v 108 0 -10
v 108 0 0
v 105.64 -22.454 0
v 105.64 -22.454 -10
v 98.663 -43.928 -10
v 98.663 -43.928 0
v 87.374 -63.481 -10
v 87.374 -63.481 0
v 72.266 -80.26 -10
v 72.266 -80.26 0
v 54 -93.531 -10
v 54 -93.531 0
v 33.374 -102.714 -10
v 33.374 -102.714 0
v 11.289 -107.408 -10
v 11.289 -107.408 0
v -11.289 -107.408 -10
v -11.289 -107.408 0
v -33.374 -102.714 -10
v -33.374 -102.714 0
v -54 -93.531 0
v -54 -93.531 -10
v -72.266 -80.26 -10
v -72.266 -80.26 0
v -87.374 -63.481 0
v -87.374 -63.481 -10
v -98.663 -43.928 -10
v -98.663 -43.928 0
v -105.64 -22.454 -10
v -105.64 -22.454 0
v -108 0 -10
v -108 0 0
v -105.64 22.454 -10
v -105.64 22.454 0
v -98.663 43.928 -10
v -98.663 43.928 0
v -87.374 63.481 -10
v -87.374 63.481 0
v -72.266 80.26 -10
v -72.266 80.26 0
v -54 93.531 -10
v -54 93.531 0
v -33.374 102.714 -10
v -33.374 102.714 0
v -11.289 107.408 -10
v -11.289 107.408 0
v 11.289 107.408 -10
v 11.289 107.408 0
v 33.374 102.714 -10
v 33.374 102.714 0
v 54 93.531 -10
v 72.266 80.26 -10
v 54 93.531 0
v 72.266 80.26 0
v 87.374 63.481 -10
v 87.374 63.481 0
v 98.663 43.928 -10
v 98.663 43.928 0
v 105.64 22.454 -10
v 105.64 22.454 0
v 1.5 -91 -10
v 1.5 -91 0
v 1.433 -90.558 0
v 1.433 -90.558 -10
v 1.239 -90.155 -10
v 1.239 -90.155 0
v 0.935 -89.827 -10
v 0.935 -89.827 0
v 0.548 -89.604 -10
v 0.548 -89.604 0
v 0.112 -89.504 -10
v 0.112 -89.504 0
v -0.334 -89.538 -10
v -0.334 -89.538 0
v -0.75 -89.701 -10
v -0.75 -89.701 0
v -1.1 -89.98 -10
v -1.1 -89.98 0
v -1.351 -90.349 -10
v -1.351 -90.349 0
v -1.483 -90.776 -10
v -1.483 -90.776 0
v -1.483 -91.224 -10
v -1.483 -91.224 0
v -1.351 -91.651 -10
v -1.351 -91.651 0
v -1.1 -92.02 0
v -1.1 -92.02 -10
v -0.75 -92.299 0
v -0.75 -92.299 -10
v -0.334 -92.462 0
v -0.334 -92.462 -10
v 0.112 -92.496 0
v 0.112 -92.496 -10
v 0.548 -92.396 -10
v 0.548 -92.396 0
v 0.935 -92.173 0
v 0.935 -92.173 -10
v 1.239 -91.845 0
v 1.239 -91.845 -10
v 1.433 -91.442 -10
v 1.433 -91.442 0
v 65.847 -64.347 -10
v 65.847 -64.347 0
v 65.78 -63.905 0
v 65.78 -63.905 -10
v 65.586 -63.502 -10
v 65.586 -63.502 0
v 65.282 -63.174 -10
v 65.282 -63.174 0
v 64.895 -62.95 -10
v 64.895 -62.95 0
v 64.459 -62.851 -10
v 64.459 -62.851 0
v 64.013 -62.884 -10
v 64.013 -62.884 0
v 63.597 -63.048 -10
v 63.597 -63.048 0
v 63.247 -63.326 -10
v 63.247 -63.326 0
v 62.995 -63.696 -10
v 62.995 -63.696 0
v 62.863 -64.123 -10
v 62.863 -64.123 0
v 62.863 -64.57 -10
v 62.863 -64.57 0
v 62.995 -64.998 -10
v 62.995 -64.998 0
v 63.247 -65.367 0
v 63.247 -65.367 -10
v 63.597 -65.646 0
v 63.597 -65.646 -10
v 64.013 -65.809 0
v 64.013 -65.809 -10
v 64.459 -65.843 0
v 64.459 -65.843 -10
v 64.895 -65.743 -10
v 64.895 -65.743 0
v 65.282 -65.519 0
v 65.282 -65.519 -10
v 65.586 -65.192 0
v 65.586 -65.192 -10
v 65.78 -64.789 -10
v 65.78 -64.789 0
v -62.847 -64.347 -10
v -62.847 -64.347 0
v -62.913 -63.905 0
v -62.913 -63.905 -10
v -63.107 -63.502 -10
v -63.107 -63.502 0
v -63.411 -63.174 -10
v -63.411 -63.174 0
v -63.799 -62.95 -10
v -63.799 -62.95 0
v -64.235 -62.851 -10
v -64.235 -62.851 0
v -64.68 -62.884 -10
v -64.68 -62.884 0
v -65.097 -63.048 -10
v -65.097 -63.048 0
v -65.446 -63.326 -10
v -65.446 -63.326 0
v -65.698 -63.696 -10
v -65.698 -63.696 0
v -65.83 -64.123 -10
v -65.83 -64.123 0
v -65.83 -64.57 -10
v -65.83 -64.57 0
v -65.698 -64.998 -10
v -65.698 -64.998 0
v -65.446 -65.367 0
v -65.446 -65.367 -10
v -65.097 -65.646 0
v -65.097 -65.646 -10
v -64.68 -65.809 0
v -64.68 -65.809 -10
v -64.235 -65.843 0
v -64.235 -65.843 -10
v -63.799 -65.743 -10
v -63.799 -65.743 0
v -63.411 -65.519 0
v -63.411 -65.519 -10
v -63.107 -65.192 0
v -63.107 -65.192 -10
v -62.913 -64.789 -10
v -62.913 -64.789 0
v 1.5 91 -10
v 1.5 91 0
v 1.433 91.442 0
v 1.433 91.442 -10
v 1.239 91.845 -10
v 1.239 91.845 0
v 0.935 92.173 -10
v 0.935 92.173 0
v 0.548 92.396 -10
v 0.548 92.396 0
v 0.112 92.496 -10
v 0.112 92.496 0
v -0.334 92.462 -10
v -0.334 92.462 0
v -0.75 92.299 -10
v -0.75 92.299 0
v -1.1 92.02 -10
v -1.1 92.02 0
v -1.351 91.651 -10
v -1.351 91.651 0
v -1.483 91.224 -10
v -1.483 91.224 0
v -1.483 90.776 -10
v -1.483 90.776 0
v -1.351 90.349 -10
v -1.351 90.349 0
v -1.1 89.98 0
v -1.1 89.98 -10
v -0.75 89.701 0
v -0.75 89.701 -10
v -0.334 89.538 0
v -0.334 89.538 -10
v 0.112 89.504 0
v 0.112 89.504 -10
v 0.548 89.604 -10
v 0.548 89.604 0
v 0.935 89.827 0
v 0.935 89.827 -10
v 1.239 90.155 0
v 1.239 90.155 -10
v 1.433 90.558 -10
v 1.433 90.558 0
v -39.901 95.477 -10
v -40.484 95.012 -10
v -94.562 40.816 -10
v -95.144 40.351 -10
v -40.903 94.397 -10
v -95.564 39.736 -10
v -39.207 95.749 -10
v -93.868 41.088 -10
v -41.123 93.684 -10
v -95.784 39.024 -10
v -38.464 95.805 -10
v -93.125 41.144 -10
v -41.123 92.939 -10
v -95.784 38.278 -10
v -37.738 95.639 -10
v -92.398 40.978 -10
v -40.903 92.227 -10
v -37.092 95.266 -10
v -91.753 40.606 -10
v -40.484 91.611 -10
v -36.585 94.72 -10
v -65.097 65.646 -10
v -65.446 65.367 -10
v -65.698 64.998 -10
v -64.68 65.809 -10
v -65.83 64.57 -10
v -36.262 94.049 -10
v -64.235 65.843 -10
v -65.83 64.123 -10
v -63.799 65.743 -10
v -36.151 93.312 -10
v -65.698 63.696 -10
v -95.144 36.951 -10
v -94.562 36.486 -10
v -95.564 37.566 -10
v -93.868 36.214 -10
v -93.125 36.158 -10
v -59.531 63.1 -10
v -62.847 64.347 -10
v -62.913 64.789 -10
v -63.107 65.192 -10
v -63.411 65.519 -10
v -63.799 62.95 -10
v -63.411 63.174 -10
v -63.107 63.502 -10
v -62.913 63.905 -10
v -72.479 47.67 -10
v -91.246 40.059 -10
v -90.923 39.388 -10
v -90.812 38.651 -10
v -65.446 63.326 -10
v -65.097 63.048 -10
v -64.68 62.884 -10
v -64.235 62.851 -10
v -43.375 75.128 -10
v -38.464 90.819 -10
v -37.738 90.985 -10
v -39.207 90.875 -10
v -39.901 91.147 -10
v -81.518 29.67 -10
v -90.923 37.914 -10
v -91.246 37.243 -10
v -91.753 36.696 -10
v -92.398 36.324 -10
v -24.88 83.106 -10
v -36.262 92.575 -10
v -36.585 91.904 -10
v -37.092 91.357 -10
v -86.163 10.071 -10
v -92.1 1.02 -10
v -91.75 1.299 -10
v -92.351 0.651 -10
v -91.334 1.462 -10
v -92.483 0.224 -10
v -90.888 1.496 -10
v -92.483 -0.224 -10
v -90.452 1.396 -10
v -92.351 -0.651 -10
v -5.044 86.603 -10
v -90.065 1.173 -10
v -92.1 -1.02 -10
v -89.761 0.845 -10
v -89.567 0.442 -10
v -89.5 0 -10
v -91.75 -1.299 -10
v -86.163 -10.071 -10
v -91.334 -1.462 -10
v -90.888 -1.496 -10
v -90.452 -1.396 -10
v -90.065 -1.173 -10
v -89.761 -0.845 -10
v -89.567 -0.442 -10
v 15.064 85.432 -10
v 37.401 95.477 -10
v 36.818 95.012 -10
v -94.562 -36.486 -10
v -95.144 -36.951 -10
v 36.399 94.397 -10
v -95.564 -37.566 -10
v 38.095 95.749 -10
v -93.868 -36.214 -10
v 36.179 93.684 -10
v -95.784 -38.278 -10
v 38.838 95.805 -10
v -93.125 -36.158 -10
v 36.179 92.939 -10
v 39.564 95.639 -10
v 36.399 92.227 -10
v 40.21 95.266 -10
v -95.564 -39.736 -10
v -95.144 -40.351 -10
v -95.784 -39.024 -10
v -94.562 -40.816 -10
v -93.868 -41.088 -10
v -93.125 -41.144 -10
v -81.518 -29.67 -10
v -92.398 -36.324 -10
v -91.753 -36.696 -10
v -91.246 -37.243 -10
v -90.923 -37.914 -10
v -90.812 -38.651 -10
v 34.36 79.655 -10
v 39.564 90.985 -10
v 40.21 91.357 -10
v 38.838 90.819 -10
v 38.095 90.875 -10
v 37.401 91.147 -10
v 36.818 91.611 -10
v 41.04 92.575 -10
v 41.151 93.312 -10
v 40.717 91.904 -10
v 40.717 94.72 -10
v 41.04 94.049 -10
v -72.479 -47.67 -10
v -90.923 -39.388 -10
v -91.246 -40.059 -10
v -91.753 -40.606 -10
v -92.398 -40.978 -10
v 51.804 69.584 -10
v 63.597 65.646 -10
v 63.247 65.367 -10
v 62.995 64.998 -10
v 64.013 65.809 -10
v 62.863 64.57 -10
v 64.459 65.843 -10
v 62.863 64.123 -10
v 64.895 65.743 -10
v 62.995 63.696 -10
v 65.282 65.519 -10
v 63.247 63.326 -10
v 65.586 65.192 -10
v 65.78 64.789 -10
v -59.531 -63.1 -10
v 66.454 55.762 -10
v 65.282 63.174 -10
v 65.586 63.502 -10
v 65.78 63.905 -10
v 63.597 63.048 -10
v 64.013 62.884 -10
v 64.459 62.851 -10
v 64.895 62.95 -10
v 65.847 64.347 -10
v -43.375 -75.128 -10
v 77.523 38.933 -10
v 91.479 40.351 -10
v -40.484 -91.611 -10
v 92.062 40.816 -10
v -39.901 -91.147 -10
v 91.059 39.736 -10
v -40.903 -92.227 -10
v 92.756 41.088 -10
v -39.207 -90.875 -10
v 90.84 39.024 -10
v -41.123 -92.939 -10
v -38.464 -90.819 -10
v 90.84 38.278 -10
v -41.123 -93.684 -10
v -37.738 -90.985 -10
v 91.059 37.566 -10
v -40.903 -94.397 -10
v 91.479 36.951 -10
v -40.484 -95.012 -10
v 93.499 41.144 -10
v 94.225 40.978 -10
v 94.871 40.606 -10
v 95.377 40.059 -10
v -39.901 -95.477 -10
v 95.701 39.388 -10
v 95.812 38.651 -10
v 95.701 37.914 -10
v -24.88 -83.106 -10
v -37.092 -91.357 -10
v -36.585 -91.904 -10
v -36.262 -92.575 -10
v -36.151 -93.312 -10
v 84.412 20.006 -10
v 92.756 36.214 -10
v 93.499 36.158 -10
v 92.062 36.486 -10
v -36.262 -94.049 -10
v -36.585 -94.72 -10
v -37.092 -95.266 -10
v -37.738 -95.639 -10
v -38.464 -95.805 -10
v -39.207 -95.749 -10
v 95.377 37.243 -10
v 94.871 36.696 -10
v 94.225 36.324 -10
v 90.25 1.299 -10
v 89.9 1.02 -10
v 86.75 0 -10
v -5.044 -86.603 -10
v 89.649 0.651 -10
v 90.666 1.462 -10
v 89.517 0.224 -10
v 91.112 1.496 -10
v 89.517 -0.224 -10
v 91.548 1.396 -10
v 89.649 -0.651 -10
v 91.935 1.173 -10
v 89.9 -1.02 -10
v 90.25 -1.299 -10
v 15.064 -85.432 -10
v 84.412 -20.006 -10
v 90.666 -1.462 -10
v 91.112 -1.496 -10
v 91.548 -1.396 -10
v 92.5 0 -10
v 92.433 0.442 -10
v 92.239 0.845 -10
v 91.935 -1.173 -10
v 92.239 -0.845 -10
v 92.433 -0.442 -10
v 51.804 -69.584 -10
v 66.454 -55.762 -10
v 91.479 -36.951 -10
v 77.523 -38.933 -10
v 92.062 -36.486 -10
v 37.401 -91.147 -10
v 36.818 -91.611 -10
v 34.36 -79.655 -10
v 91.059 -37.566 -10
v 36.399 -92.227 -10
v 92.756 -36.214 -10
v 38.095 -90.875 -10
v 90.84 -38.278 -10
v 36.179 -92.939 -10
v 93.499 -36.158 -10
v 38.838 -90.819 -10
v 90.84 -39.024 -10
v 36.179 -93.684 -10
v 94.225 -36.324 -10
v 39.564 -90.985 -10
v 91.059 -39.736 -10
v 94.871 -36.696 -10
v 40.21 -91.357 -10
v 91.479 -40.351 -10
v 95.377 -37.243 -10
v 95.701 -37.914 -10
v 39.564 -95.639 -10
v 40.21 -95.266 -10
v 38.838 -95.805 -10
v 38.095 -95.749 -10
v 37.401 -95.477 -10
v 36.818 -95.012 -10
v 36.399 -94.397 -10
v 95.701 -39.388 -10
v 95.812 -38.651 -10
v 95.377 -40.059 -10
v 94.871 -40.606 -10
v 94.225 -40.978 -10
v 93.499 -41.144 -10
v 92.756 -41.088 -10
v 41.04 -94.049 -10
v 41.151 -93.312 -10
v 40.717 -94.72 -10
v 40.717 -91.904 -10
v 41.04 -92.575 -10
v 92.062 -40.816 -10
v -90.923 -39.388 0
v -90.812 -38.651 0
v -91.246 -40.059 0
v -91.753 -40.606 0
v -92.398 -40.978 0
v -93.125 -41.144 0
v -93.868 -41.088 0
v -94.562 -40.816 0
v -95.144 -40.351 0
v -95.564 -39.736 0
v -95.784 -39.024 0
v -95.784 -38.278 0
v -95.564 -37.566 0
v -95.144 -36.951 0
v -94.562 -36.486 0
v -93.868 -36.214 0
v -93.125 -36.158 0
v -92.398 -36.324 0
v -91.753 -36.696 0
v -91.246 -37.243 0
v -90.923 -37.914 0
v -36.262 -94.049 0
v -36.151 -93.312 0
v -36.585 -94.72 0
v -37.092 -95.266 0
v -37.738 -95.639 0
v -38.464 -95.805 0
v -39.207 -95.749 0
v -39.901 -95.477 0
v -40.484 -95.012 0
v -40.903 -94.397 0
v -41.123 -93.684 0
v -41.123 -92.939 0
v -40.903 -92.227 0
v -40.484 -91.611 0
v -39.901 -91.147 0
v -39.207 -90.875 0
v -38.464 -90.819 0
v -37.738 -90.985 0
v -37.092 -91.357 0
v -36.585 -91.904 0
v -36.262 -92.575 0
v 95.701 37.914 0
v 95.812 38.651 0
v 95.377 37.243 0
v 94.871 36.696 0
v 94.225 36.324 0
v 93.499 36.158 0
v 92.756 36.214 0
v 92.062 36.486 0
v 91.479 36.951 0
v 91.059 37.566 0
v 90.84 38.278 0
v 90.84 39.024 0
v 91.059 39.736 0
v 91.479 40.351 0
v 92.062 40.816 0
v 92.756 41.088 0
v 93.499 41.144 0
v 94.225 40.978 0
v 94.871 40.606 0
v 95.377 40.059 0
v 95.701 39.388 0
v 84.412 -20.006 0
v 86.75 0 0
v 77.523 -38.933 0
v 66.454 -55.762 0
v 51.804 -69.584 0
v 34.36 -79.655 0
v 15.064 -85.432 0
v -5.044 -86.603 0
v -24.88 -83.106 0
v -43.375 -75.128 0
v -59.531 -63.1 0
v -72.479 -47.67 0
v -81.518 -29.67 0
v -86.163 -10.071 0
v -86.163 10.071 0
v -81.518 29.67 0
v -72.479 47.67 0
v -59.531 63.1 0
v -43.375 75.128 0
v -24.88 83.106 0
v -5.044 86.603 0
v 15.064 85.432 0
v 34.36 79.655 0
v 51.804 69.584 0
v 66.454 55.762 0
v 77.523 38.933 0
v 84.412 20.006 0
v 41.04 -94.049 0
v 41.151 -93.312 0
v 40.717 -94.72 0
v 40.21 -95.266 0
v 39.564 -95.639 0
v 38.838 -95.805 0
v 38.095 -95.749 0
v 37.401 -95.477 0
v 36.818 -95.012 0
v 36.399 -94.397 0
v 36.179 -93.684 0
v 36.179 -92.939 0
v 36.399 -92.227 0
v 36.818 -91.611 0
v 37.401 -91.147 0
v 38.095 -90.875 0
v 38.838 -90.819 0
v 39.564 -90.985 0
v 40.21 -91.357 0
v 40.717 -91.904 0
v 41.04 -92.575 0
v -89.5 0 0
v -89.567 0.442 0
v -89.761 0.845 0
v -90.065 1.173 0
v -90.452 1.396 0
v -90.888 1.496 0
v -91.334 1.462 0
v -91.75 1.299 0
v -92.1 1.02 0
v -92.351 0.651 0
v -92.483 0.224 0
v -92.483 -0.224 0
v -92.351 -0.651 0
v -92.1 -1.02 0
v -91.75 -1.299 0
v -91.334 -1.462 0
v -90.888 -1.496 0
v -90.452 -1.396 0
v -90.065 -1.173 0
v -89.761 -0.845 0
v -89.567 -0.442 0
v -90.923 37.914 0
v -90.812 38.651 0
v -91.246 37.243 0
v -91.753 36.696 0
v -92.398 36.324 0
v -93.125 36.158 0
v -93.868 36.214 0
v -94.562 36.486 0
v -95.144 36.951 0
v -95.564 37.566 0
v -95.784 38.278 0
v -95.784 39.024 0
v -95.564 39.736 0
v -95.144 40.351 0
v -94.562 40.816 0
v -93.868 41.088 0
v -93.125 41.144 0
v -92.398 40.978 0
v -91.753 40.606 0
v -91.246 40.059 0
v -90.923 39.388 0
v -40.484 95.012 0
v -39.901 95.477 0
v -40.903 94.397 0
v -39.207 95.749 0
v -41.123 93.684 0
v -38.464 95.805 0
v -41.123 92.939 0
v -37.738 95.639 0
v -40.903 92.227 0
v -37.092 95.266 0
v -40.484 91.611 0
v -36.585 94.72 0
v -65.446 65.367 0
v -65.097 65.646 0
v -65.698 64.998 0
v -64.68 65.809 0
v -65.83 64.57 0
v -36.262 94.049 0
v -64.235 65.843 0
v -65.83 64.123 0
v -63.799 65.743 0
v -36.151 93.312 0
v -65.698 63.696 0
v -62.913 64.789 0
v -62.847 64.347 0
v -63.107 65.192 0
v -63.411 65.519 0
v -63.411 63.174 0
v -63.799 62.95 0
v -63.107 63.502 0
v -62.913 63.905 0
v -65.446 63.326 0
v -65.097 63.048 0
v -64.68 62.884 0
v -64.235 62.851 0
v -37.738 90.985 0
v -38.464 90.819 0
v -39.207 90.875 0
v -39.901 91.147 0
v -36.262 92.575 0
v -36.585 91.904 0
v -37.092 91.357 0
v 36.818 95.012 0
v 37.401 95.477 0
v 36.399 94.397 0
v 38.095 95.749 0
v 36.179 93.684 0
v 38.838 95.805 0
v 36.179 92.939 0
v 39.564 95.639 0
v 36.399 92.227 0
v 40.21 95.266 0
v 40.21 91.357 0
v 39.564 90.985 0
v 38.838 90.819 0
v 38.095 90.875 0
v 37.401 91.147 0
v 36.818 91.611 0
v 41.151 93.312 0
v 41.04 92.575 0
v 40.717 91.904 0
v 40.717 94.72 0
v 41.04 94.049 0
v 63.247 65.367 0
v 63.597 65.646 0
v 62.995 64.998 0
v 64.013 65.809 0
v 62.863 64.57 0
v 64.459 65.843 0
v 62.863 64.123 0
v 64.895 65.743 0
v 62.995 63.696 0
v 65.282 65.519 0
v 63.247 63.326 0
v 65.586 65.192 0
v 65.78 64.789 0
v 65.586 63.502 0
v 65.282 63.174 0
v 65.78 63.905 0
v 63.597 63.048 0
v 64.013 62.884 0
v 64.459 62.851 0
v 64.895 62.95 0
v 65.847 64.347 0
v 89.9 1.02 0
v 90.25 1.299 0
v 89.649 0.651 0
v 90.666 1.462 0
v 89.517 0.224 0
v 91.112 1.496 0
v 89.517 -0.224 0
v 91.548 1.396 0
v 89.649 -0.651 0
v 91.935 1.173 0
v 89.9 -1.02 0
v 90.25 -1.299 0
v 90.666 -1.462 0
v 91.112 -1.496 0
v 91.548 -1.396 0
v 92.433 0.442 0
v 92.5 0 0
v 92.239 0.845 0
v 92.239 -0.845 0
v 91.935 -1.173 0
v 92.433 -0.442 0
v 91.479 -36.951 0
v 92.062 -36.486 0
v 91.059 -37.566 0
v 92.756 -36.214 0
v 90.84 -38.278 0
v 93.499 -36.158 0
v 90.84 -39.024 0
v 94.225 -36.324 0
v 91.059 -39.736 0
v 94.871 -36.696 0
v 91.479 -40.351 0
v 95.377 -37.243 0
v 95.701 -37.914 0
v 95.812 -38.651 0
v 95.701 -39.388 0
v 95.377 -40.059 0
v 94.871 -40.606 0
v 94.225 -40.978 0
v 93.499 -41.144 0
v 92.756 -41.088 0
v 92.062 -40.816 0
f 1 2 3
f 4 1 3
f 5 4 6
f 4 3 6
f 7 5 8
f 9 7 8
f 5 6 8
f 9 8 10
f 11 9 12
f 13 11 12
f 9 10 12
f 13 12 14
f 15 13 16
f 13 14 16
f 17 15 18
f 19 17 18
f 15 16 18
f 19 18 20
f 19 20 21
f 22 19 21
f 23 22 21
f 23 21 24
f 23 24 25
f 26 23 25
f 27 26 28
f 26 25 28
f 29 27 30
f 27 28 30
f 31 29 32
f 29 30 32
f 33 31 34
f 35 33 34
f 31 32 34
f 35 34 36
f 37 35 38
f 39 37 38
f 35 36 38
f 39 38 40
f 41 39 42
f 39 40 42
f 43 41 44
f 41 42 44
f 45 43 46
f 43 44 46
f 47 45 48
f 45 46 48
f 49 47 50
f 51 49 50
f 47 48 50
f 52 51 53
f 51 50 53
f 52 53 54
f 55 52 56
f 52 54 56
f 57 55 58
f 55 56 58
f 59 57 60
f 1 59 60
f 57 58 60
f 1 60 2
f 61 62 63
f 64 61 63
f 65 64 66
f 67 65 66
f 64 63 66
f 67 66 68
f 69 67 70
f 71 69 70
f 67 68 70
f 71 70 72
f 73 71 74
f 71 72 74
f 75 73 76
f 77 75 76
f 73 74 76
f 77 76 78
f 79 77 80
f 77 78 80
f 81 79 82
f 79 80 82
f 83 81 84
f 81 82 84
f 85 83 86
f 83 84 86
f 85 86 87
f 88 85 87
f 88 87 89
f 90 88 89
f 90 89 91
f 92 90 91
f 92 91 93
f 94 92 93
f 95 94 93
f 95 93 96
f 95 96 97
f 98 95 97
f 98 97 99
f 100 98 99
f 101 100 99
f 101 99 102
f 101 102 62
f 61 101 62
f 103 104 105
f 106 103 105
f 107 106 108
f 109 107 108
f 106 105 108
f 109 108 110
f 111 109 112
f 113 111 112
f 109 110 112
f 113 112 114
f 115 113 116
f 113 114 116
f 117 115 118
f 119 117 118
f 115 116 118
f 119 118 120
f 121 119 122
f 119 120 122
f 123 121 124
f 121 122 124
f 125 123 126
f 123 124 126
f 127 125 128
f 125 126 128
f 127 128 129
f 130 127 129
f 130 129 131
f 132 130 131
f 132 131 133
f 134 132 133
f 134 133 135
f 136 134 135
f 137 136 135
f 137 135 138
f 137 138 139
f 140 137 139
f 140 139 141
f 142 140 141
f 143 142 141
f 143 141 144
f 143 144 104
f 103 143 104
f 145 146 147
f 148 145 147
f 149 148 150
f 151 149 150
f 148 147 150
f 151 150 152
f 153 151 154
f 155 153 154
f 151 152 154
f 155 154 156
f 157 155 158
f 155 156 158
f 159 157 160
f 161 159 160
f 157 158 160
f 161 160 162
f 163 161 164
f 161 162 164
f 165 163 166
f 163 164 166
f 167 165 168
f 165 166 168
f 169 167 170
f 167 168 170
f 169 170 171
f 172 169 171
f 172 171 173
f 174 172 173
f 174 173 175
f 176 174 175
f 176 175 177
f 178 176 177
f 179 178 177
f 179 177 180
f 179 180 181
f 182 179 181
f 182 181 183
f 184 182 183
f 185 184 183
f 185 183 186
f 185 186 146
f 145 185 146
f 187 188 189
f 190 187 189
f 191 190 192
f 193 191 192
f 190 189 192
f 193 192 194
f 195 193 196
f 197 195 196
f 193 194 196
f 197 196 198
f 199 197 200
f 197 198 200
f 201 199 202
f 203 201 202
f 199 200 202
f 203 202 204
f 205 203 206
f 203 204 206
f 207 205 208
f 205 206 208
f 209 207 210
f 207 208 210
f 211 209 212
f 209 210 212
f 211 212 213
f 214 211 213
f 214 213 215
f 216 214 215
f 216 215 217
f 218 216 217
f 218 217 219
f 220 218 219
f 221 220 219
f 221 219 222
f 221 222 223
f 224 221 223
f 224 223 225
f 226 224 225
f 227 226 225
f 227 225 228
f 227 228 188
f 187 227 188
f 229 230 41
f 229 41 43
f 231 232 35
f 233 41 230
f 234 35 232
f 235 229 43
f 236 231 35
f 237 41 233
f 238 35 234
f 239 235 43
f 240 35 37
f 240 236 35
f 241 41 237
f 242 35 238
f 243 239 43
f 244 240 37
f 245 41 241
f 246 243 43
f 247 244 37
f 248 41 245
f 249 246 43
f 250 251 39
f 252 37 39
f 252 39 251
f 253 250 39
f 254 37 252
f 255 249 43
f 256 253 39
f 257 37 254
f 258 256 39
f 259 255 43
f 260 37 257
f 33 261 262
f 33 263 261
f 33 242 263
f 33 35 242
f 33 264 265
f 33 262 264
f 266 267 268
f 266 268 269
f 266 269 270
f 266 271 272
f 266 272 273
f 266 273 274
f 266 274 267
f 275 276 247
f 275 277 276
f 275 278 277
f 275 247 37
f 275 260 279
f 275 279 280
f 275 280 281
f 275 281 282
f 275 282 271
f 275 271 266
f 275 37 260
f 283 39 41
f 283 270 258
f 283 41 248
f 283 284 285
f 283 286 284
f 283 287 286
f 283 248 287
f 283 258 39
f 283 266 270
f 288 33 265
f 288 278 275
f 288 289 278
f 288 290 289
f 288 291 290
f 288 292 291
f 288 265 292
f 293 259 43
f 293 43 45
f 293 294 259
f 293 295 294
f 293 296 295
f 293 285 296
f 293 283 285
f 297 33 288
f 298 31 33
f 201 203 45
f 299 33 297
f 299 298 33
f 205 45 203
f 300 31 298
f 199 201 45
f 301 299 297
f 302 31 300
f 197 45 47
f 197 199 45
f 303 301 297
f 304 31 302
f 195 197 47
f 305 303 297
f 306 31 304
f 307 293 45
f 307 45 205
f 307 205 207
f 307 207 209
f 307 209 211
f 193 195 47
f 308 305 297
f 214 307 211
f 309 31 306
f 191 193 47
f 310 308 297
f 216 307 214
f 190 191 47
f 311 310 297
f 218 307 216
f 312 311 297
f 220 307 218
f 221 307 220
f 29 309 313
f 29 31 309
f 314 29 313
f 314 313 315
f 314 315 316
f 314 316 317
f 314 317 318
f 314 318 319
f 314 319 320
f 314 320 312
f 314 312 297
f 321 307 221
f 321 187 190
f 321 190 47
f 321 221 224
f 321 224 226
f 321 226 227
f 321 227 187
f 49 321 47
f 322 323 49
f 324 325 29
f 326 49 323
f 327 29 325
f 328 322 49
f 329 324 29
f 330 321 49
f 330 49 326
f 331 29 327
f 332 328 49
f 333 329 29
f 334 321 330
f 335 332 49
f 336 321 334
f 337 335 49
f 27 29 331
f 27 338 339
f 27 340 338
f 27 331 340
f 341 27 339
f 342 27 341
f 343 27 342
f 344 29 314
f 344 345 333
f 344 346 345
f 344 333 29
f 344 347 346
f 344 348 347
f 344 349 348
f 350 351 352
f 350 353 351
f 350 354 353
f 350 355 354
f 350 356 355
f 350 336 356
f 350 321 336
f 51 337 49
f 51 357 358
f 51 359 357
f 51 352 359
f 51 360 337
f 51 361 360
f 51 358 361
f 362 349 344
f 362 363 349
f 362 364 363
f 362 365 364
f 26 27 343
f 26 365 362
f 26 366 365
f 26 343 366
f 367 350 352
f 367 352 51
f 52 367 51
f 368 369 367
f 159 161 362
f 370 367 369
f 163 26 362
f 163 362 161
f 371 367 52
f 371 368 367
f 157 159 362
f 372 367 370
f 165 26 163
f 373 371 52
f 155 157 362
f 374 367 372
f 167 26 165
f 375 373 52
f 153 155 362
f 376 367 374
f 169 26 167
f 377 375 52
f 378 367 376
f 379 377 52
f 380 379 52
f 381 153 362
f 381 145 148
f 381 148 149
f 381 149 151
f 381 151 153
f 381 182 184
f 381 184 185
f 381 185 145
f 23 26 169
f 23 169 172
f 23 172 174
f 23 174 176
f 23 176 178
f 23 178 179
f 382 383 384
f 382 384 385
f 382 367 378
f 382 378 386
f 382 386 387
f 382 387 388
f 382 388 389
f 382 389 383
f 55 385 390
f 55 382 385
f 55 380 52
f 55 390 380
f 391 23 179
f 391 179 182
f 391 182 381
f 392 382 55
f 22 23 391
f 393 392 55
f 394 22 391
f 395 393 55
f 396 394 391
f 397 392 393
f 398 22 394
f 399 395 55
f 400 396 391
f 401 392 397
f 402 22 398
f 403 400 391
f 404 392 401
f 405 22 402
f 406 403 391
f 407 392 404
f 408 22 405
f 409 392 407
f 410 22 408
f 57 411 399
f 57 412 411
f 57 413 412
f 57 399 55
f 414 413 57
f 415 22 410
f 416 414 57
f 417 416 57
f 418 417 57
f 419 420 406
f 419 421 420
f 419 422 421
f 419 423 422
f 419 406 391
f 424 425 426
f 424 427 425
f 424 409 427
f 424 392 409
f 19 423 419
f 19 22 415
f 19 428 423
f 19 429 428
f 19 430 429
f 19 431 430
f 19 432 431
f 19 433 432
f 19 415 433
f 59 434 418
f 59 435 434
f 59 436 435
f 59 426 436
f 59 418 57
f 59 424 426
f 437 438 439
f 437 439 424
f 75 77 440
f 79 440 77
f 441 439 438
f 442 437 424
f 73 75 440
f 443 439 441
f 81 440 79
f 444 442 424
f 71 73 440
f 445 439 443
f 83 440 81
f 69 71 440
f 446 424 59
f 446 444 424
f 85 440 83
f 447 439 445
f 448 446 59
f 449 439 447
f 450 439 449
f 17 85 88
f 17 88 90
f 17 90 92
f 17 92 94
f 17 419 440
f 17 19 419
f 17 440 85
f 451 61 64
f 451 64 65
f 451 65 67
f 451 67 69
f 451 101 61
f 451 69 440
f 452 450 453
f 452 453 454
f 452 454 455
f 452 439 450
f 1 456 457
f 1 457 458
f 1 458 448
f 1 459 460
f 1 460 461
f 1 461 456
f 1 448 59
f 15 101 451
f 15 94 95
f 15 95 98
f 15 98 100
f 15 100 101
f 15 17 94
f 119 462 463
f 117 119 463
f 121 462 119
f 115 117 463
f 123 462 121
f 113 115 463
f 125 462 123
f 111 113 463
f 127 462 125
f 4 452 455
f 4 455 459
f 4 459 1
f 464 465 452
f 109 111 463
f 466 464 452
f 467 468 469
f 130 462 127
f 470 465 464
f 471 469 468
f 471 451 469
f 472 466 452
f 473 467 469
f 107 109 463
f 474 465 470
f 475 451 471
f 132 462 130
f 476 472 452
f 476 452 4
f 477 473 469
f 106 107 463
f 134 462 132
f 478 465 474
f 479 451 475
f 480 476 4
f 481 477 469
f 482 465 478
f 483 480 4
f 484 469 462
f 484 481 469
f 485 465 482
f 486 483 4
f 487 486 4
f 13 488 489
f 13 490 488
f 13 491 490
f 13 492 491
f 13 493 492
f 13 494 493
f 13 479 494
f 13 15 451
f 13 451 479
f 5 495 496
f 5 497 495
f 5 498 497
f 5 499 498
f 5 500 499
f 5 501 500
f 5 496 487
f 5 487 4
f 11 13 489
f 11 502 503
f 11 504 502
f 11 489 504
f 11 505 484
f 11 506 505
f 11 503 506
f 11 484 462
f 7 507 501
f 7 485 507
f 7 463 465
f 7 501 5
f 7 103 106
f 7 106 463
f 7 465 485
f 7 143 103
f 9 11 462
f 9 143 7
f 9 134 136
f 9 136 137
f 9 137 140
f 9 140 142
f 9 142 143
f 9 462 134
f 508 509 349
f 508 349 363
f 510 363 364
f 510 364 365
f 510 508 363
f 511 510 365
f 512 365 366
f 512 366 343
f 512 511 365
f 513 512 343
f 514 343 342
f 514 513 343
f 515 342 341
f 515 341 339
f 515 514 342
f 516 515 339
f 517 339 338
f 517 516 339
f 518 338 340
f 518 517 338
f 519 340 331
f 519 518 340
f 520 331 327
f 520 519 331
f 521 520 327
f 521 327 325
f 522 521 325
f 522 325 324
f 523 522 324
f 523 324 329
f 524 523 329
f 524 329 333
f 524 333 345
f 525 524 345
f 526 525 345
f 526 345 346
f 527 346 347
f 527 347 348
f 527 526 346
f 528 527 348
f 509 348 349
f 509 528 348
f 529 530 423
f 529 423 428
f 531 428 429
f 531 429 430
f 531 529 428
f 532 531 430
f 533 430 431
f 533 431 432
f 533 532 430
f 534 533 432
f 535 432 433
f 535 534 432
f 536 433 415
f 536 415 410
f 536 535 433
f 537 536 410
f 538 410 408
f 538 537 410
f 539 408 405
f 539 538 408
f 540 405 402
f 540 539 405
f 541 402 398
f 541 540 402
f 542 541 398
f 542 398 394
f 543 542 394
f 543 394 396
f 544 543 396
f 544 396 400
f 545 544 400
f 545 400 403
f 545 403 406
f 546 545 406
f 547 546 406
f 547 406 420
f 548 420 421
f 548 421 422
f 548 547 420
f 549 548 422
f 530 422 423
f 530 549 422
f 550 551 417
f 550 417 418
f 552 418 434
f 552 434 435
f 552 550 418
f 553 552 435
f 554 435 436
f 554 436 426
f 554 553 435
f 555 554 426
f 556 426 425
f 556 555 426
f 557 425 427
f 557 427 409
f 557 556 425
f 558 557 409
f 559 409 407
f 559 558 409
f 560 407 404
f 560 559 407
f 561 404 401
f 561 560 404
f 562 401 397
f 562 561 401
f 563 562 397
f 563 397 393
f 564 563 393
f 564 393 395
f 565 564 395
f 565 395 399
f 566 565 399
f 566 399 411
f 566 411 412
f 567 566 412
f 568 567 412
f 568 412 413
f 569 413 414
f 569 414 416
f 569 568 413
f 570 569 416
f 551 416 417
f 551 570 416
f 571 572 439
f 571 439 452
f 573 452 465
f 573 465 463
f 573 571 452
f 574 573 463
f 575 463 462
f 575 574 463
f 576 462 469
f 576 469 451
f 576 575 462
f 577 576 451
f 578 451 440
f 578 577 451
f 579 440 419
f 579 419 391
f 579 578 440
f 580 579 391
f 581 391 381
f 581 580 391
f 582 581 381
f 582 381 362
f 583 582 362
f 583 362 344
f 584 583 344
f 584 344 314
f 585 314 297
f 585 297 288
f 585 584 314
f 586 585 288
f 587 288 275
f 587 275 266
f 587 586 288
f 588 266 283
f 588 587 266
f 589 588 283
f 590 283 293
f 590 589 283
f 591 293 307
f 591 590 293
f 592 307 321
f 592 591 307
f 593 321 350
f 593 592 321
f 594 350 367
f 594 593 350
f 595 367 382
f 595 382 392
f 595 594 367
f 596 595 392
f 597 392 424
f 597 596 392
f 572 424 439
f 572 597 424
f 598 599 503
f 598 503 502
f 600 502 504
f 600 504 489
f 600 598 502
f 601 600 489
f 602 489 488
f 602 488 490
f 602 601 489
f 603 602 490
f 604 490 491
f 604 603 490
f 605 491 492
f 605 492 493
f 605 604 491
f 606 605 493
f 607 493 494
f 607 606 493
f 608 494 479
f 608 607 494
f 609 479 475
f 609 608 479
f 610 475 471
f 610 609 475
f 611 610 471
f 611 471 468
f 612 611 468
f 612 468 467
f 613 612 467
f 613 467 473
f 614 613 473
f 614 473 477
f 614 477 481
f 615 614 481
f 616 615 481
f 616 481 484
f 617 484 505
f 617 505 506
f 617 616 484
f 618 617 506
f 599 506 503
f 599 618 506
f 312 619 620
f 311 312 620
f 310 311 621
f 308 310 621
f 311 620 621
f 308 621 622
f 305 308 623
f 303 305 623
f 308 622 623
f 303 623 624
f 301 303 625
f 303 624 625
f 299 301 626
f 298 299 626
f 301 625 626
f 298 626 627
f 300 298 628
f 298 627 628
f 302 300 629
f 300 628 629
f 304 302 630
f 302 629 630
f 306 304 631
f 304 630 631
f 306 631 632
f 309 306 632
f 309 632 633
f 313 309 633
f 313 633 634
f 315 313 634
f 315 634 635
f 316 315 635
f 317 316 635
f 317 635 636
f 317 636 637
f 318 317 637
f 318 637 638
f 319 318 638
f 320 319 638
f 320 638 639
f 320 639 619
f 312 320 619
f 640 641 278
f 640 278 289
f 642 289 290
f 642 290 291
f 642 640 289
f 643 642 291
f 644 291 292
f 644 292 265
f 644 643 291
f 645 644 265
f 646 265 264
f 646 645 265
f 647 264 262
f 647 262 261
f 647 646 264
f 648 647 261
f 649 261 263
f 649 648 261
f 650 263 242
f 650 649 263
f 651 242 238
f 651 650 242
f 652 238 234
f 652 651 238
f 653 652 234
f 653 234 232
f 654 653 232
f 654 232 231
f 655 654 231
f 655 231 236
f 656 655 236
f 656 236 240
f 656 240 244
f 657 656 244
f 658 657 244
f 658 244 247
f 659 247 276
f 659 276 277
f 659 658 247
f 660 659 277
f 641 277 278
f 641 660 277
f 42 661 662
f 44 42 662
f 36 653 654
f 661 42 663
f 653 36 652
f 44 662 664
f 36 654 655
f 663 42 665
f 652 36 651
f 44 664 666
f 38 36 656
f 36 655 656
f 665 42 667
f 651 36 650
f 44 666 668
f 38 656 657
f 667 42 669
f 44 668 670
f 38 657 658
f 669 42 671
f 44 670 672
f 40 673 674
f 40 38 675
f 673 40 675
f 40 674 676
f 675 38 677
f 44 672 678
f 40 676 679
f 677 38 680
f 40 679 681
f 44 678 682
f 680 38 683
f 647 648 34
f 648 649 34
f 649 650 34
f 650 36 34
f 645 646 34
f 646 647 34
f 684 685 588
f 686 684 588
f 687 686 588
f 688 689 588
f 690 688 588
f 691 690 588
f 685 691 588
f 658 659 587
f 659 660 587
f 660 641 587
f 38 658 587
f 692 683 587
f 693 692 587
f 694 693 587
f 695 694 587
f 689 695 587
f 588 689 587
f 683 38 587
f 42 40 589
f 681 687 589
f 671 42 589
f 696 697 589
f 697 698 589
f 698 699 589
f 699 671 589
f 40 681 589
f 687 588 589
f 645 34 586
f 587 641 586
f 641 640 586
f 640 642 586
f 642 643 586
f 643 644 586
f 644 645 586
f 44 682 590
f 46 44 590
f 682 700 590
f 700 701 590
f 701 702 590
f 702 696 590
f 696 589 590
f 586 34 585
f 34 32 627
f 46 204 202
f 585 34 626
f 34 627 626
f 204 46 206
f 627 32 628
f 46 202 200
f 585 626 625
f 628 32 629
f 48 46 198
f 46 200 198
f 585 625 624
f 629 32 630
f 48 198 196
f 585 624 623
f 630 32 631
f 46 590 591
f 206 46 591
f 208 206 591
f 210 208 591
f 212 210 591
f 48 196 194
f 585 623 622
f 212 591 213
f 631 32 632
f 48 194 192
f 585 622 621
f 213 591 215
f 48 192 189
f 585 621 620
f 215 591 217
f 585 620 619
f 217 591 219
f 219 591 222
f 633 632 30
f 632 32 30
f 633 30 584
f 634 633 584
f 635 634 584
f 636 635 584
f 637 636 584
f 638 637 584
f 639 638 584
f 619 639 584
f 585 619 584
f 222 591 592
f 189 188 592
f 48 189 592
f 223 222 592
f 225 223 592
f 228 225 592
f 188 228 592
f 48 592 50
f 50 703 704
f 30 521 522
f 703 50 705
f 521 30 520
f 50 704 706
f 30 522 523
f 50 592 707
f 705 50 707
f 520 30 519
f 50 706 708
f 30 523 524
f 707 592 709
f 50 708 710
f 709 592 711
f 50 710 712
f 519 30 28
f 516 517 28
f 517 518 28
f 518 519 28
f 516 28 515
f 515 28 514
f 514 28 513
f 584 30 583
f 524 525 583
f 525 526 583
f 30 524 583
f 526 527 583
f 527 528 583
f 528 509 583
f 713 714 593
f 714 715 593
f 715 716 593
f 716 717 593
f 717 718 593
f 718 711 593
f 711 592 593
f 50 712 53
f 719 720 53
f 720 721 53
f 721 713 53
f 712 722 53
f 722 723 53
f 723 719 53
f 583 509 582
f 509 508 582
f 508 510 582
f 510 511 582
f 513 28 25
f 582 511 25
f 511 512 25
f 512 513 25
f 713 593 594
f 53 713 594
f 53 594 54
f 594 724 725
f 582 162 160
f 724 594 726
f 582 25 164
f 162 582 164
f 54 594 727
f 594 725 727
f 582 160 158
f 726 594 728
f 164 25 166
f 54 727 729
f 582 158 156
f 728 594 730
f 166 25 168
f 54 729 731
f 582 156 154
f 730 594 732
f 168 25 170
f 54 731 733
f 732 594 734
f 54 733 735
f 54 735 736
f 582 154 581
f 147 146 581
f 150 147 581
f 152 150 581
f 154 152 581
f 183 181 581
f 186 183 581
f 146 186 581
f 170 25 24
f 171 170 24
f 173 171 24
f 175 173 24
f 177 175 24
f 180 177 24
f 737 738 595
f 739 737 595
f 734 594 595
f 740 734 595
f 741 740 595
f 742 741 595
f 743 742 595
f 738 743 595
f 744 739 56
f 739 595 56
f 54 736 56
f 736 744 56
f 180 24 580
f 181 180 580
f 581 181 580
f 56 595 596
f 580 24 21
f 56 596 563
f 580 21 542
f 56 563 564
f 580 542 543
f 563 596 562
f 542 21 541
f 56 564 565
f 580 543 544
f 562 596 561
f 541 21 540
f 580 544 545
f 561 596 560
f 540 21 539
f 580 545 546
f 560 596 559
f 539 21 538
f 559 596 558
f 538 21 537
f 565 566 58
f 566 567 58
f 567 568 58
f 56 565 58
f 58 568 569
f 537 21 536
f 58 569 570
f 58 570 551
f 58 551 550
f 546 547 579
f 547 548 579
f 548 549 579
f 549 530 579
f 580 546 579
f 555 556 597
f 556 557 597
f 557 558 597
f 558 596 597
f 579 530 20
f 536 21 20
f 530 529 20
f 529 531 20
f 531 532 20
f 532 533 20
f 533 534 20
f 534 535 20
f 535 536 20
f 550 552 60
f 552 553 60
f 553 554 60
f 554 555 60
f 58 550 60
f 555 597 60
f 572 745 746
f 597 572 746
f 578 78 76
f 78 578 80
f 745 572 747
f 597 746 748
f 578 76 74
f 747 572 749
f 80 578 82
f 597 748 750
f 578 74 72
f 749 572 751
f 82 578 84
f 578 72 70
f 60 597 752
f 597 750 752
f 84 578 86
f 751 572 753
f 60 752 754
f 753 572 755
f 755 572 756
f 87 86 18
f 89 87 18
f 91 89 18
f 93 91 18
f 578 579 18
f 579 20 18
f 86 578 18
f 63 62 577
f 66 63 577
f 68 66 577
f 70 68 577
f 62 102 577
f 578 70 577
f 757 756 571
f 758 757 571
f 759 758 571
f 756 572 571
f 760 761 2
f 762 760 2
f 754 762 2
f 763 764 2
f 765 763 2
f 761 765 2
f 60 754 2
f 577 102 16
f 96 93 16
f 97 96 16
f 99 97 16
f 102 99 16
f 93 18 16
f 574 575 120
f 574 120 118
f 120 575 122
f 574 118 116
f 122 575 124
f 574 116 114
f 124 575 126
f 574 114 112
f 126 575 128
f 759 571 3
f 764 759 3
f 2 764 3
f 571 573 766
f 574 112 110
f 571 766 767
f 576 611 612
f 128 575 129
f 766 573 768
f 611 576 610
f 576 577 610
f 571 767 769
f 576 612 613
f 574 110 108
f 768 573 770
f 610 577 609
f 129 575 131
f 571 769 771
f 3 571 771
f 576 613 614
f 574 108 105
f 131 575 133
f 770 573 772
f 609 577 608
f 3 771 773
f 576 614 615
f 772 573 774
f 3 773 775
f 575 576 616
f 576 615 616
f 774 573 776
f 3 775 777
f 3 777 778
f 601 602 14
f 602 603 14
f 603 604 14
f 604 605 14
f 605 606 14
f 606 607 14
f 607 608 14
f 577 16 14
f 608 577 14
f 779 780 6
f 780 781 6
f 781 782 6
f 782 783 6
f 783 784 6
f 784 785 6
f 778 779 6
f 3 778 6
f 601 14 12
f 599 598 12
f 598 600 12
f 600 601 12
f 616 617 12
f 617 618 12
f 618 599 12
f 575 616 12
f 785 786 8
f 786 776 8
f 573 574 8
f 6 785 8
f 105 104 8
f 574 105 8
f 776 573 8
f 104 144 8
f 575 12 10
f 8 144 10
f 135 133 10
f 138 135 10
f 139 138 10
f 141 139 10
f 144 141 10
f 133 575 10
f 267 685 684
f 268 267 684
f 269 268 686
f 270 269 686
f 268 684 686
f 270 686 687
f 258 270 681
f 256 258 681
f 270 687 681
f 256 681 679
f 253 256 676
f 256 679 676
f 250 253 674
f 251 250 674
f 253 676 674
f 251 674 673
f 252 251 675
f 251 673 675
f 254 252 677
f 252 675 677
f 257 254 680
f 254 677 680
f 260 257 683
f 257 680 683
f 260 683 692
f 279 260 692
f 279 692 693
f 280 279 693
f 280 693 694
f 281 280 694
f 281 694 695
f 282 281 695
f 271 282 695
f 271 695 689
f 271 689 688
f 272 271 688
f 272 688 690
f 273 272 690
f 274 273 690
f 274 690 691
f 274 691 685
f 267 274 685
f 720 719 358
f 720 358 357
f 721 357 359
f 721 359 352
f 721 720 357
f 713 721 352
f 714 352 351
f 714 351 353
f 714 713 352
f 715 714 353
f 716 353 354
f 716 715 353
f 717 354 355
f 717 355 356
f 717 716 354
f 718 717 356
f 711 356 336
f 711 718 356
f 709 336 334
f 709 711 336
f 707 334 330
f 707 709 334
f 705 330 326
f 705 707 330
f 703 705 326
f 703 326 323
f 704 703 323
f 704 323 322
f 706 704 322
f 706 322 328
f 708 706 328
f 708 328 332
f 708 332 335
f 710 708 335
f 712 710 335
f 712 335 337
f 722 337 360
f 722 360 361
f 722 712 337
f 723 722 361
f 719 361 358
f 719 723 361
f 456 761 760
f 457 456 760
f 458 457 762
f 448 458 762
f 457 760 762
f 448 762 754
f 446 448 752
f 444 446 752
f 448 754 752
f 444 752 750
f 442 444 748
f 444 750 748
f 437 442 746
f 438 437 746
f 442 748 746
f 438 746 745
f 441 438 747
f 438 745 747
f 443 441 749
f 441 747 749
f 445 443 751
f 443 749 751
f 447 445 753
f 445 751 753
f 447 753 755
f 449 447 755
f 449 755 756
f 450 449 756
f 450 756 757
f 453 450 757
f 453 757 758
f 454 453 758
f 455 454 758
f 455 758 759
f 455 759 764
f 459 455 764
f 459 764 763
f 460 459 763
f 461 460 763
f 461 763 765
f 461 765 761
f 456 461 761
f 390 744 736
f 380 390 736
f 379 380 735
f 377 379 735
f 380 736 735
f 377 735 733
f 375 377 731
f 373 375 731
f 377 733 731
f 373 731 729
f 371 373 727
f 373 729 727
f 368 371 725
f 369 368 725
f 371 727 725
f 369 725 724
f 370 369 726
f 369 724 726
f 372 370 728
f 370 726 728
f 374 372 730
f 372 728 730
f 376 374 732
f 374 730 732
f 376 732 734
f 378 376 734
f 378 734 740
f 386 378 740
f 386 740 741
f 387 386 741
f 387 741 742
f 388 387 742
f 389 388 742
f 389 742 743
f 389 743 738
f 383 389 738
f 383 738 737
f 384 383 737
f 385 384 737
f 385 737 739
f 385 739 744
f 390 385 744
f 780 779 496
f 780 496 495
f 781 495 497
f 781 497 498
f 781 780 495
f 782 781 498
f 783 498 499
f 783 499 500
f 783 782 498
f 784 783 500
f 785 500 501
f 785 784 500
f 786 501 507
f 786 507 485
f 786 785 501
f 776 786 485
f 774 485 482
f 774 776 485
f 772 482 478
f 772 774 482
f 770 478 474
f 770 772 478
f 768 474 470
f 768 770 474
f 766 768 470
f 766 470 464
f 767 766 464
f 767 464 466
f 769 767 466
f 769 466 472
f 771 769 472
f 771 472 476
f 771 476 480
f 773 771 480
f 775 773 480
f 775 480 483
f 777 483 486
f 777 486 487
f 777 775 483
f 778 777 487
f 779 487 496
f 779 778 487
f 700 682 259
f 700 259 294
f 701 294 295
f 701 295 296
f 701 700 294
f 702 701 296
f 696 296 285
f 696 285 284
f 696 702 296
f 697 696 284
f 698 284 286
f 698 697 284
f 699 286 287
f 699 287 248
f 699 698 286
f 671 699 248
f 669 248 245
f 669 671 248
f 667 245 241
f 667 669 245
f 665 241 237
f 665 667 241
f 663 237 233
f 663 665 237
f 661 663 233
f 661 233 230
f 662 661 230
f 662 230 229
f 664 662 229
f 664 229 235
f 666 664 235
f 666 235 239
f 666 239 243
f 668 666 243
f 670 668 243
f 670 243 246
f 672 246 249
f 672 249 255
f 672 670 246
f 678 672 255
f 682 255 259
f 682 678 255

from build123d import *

# Parameters (mm, degrees)
SKETCH001_R       = 108
SKETCH001_R_2     = 86.75
SKETCH001_R_3     = 2.5
PAD_DEPTH         = 10
SKETCH_R          = 1.5
POCKET_DEPTH      = 10.001
POCKET_DEPTH_BACK = 0.001


with BuildPart() as part:
    # Sketch001 → Pad (new body)
    with BuildSketch(Plane(origin=(0, 0, 0), x_dir=(1, 0, 0), z_dir=(0, 0, -1))):
        Circle(SKETCH001_R)
        Circle(SKETCH001_R_2, mode=Mode.SUBTRACT)
        with Locations((38.651027, 93.311833)):
            Circle(SKETCH001_R_3, mode=Mode.SUBTRACT)
        with Locations((93.311833, 38.651027)):
            Circle(SKETCH001_R_3, mode=Mode.SUBTRACT)
        with Locations((93.311833, -38.651027)):
            Circle(SKETCH001_R_3, mode=Mode.SUBTRACT)
        with Locations((38.651027, -93.311833)):
            Circle(SKETCH001_R_3, mode=Mode.SUBTRACT)
        with Locations((-38.651027, 93.311833)):
            Circle(SKETCH001_R_3, mode=Mode.SUBTRACT)
        with Locations((-93.311833, 38.651027)):
            Circle(SKETCH001_R_3, mode=Mode.SUBTRACT)
        with Locations((-93.311833, -38.651027)):
            Circle(SKETCH001_R_3, mode=Mode.SUBTRACT)
        with Locations((-38.651027, -93.311833)):
            Circle(SKETCH001_R_3, mode=Mode.SUBTRACT)
    extrude(amount=PAD_DEPTH)

    # Sketch → Pocket (cut, two sides)
    with BuildSketch(Plane.XY) as pocket_sk:
        with Locations((64.346717, 64.346717)):
            Circle(SKETCH_R)
        with Locations((0, 91)):
            Circle(SKETCH_R)
        with Locations((91, 0)):
            Circle(SKETCH_R)
        with Locations((64.346717, -64.346717)):
            Circle(SKETCH_R)
        with Locations((0, -91)):
            Circle(SKETCH_R)
        with Locations((-91, 0)):
            Circle(SKETCH_R)
        with Locations((-64.346717, -64.346717)):
            Circle(SKETCH_R)
        with Locations((-64.346717, 64.346717)):
            Circle(SKETCH_R)
    extrude(amount=-POCKET_DEPTH, mode=Mode.SUBTRACT)
    extrude(pocket_sk.sketch, amount=POCKET_DEPTH_BACK, mode=Mode.SUBTRACT)


solid = part.part
